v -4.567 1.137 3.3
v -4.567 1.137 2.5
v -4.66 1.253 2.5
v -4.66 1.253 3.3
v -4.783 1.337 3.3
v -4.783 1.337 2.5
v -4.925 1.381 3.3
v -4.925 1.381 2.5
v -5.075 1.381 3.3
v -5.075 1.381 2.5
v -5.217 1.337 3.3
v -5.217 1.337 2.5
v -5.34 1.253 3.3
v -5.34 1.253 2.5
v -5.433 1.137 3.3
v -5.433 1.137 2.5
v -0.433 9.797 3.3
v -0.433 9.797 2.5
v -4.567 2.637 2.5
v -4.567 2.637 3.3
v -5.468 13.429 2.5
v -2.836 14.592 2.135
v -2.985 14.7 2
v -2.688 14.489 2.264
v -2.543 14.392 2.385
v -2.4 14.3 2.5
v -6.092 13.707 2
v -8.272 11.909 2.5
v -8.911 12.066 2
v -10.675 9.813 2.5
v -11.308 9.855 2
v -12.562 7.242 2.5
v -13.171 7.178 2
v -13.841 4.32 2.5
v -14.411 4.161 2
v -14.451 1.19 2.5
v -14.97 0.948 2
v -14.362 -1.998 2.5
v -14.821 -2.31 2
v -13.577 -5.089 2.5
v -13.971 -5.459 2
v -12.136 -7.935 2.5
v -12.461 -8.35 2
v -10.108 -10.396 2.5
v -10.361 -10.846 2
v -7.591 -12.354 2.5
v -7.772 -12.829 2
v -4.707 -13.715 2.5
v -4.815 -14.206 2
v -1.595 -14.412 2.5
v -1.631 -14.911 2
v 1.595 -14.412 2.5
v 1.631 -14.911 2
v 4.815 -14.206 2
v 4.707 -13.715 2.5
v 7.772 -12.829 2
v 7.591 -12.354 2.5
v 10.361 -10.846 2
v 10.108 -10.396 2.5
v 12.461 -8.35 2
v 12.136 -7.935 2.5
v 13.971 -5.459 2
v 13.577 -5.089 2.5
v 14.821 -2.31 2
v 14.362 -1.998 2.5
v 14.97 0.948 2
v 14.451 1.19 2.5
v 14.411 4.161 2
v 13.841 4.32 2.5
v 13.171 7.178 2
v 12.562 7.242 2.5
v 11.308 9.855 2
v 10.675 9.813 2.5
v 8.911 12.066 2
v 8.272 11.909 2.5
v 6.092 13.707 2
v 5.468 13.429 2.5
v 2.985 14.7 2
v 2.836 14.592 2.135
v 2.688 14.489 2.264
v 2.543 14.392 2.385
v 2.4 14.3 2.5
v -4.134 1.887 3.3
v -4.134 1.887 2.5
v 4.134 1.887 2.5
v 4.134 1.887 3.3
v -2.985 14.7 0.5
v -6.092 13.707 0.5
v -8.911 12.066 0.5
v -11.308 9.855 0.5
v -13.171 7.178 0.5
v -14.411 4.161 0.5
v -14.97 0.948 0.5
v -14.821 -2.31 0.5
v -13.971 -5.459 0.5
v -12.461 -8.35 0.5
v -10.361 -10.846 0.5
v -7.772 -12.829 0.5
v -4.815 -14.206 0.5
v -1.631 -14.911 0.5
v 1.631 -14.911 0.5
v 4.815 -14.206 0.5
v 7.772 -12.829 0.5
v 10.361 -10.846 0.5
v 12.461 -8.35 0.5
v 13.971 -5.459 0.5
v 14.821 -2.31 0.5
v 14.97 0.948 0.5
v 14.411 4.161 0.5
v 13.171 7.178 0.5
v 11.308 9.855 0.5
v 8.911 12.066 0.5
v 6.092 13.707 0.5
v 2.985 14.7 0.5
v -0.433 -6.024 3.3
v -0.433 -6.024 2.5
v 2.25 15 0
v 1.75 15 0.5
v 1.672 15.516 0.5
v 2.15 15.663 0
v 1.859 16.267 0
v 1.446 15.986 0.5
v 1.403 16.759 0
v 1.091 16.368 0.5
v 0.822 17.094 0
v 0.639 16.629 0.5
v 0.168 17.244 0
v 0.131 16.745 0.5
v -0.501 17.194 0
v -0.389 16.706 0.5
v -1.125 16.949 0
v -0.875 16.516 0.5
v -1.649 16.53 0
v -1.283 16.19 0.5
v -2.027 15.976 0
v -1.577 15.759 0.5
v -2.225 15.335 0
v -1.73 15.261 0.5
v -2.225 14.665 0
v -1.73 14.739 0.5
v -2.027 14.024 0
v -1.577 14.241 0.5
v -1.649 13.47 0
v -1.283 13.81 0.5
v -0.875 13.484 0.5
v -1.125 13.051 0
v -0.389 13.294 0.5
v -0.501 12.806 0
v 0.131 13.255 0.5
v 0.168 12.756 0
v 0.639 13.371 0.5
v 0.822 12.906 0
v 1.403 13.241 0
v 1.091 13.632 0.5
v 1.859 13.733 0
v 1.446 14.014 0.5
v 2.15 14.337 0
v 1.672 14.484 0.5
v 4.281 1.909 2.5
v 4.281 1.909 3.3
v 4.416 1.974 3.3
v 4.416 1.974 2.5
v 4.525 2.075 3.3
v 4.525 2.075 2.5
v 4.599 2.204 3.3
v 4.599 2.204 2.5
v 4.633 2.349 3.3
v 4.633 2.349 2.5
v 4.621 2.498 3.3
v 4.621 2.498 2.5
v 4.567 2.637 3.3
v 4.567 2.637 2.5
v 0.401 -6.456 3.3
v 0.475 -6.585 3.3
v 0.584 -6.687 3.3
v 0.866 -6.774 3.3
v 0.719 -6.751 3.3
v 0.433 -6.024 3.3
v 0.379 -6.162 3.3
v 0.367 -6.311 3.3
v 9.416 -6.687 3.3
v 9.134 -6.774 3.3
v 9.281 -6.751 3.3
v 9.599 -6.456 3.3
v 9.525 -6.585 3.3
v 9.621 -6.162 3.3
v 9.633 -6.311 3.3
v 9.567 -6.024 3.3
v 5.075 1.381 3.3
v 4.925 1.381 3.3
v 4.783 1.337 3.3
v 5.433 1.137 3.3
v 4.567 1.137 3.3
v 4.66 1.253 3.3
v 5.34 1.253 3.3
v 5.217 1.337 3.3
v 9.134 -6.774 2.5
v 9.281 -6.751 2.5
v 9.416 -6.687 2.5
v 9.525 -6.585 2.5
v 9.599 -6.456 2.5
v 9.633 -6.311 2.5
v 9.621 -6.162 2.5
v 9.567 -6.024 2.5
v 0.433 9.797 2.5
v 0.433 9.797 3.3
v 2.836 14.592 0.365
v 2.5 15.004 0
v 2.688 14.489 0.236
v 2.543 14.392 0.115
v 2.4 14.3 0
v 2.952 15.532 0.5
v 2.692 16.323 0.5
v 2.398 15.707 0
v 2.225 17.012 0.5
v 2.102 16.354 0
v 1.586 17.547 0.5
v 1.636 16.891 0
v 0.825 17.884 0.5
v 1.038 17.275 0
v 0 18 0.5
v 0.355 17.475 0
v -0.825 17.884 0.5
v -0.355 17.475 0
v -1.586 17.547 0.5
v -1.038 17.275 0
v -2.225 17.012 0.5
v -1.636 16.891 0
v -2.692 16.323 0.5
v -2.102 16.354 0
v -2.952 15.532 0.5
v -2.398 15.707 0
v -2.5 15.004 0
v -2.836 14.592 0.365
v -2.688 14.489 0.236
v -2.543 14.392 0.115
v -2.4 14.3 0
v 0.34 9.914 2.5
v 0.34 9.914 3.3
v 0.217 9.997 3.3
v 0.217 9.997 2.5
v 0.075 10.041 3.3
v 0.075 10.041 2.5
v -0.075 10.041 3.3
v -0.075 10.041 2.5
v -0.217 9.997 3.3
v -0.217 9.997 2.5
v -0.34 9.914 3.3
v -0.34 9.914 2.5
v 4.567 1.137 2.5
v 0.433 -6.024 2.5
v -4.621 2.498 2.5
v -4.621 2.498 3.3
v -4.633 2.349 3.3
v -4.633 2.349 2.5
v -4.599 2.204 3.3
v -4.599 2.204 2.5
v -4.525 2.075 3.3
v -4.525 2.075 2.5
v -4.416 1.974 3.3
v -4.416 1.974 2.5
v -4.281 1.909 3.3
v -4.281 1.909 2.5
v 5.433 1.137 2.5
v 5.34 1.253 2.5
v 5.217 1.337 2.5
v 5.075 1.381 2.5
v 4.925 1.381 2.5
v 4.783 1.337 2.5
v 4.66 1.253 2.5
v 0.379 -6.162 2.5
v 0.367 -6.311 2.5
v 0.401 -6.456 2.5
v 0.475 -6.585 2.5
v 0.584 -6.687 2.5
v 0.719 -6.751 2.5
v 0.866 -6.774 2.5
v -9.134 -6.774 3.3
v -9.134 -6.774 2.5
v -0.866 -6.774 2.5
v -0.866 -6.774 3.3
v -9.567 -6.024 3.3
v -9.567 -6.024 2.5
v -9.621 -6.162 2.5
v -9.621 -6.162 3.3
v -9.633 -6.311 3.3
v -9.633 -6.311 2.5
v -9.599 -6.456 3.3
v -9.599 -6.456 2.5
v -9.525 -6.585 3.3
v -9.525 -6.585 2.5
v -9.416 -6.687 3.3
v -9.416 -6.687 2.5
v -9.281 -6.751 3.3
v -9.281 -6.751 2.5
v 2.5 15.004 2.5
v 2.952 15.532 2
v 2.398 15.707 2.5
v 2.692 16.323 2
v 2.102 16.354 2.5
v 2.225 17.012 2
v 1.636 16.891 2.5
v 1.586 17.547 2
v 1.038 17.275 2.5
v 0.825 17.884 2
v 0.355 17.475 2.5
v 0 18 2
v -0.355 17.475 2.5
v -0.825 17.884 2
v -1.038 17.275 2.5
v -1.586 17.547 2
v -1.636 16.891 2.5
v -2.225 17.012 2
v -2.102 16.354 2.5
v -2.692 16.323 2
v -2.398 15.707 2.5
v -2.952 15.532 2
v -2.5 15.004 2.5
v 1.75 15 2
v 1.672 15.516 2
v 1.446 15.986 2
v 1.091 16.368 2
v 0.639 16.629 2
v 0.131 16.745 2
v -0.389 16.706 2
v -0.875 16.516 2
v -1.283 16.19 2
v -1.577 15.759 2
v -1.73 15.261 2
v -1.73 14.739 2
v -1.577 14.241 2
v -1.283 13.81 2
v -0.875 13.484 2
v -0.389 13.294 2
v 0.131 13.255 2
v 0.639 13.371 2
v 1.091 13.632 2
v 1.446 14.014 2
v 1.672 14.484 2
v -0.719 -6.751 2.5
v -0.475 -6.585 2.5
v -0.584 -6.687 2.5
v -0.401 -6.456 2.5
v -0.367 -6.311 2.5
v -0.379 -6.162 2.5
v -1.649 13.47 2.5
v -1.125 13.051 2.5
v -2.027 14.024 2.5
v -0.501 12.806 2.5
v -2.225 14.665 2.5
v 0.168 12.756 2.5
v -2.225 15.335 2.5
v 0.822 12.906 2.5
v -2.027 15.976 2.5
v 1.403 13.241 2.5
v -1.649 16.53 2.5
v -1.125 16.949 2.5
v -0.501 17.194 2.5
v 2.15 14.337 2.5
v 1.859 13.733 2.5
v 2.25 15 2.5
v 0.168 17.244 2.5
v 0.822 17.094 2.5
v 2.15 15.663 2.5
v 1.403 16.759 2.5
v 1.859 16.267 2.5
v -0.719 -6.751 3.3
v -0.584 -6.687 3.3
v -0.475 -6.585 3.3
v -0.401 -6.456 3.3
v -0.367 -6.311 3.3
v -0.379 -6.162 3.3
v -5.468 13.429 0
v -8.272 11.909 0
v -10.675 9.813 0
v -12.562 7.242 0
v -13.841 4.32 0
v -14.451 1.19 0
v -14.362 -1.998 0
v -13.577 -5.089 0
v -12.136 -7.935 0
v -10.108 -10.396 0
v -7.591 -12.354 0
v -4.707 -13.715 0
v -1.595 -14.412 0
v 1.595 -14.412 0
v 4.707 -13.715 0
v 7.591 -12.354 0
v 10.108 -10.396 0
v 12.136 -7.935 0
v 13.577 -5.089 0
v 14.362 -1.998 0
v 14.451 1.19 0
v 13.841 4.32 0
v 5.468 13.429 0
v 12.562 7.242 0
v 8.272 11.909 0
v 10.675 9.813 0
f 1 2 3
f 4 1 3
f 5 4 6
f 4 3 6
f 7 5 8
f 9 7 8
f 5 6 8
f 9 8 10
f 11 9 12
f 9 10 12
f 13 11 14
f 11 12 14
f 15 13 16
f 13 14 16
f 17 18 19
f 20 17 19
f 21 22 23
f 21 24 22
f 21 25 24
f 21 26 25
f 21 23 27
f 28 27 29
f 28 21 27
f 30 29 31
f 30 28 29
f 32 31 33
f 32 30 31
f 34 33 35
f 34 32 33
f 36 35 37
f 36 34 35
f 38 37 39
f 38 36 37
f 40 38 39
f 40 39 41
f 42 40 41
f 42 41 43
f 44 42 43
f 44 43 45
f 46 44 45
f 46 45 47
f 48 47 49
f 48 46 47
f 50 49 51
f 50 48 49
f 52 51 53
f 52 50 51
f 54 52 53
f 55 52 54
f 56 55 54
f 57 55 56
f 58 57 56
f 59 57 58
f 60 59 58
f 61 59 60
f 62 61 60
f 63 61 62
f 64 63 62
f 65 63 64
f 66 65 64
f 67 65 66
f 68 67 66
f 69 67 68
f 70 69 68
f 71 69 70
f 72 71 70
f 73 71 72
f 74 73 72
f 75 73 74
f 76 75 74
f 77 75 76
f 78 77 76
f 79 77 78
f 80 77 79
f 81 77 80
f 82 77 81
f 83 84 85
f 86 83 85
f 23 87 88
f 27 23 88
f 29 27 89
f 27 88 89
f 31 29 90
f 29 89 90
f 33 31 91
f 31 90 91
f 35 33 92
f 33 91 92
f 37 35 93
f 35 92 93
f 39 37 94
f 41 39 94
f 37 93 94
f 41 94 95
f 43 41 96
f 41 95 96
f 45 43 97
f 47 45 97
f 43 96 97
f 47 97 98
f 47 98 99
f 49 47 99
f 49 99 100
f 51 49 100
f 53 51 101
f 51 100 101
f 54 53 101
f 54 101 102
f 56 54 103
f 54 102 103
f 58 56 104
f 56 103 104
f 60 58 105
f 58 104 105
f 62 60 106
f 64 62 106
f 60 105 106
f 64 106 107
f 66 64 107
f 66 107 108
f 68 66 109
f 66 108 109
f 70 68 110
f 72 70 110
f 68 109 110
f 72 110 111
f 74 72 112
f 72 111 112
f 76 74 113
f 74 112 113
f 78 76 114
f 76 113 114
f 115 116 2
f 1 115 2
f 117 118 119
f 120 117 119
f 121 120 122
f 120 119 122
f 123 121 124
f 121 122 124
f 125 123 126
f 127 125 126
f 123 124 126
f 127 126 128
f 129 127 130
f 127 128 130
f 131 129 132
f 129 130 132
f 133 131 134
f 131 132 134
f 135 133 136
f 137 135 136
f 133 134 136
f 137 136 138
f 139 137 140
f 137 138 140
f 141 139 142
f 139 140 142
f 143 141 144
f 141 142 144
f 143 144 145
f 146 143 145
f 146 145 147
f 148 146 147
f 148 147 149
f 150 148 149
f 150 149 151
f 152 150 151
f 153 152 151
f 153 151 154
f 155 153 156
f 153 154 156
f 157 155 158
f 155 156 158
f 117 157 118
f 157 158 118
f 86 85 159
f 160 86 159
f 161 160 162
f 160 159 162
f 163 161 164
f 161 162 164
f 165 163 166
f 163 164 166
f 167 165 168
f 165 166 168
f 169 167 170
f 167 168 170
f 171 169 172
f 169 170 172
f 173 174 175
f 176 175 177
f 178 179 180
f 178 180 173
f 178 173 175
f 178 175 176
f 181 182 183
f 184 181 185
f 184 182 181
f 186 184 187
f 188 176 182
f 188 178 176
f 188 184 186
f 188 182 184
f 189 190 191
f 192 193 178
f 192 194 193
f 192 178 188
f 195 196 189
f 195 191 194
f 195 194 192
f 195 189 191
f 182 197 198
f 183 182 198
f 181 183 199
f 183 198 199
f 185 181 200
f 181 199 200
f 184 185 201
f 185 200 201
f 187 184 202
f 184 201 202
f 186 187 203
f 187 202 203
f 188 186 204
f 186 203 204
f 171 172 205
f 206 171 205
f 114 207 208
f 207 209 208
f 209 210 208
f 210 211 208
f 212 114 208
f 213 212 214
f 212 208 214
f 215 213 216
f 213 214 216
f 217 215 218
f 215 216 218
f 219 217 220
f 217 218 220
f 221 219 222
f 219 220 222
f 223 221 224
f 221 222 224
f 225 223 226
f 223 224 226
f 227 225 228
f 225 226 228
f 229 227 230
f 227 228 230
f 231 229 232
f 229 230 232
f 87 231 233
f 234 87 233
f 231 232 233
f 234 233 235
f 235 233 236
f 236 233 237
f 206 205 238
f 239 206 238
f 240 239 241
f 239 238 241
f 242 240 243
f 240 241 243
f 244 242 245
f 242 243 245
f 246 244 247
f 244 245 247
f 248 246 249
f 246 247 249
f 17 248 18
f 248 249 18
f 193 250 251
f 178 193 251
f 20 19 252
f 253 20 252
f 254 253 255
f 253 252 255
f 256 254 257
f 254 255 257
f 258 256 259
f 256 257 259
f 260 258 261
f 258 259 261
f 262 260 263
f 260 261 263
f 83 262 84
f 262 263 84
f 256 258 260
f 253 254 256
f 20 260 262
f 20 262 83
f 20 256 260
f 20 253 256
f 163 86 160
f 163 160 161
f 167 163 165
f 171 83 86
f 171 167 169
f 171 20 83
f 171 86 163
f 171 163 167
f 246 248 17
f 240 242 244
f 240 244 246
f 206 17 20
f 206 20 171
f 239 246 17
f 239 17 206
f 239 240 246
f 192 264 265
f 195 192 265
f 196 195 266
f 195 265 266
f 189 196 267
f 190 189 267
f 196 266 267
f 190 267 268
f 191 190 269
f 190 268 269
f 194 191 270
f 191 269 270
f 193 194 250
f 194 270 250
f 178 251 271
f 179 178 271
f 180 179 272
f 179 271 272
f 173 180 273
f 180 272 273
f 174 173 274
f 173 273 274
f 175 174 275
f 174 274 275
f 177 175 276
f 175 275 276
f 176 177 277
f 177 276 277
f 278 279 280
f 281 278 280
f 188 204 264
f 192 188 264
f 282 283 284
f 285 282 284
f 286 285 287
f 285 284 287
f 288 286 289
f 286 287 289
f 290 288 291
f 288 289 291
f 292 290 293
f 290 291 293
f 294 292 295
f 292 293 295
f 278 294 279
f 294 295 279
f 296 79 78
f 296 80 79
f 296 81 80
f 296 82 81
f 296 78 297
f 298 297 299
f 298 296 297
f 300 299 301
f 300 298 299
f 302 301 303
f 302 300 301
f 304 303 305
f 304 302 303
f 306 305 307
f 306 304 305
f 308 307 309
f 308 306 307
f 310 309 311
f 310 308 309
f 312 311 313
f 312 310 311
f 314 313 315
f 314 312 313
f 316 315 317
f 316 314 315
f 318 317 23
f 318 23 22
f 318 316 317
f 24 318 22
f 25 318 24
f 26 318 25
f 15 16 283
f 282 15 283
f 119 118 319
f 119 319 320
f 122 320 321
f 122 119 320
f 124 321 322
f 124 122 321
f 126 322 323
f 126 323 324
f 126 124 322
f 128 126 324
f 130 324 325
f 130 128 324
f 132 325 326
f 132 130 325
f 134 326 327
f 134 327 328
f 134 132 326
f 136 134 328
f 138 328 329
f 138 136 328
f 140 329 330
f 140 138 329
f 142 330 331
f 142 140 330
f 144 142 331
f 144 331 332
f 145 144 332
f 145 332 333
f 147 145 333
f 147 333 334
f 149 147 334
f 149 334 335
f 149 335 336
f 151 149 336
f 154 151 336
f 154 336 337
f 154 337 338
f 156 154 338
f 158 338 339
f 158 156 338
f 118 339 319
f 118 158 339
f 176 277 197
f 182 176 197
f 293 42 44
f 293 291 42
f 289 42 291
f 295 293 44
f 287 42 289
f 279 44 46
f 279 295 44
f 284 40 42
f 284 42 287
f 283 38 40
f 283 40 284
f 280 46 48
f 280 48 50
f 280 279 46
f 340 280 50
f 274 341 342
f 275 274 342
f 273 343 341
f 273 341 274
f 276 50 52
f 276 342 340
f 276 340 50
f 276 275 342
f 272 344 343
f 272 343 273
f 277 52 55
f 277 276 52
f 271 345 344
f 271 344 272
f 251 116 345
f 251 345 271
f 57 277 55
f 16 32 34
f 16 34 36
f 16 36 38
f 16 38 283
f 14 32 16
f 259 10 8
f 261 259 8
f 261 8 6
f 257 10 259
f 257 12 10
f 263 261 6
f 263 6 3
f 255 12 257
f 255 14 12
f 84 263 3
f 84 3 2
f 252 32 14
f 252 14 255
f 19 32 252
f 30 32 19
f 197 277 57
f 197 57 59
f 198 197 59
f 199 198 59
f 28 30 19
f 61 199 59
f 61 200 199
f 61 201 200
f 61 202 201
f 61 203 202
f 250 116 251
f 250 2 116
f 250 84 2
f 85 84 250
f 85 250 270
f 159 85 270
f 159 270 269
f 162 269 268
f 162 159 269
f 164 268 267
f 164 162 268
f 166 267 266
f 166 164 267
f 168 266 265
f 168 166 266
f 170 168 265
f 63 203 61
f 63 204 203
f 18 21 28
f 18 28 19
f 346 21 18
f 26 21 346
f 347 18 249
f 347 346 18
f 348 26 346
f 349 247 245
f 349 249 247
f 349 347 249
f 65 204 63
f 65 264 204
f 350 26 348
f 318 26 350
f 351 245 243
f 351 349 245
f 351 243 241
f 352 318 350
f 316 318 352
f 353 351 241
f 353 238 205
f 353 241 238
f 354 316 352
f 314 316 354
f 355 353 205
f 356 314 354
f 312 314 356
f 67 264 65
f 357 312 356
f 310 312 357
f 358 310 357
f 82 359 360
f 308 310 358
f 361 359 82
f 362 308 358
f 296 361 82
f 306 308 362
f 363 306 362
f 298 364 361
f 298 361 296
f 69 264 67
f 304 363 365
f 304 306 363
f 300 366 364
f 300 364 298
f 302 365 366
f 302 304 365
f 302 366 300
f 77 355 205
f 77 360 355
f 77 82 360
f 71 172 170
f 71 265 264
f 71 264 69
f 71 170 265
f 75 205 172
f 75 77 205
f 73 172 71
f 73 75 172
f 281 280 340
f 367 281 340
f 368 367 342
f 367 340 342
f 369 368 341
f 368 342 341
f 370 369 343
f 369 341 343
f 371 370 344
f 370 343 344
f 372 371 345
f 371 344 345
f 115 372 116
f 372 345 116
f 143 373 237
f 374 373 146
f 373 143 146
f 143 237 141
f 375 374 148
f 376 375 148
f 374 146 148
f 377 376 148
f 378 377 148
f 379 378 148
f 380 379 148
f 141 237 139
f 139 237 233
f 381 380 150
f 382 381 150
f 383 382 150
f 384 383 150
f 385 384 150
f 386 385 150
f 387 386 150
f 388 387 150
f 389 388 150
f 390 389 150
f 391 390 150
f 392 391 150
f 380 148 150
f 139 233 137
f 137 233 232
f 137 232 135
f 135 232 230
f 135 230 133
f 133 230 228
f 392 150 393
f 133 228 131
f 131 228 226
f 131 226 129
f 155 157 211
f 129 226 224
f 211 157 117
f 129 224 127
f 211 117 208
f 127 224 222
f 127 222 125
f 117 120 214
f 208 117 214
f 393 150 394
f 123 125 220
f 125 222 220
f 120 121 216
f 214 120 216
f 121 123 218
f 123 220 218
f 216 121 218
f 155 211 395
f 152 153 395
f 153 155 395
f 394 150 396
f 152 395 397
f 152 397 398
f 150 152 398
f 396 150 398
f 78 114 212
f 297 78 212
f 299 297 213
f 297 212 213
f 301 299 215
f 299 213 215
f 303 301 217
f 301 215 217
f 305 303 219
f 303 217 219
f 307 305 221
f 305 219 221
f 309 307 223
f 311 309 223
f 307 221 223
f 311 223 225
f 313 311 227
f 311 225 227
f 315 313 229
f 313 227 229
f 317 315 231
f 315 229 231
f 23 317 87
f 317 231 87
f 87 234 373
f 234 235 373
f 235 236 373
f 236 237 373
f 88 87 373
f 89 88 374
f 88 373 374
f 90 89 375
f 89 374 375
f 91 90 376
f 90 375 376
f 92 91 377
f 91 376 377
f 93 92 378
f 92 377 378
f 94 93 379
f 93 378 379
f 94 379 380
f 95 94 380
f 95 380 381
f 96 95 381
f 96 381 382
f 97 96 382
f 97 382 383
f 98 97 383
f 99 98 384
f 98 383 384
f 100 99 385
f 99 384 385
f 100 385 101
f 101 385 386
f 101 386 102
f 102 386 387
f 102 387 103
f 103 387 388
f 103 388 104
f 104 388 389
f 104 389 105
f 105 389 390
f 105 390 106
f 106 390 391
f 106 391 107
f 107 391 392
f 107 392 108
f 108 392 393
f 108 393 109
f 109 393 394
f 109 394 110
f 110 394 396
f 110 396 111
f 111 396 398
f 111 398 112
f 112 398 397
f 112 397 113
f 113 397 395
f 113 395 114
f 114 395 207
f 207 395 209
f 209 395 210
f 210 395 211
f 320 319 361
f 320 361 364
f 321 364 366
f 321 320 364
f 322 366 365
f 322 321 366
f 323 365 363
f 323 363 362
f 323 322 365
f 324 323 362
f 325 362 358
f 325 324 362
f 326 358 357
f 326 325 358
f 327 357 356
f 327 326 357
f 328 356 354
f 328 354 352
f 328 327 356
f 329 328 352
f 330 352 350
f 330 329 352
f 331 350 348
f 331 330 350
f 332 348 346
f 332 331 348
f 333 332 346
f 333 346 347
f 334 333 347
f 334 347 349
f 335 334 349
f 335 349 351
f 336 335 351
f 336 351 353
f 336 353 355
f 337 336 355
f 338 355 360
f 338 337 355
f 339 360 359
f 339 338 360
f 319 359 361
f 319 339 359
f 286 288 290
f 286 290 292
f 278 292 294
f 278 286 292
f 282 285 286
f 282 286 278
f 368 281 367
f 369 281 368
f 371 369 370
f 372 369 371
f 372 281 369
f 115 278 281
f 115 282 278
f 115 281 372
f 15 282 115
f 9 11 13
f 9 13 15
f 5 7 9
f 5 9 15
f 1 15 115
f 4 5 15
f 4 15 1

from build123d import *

# Parameters (mm, degrees)
F0_R     = 1.75
F1_DEPTH = 2.5
F3_DEPTH = 0.8
F4_SIZE  = 0.5


with BuildPart() as f1:
    # F0 (on Top) → F1 (new body)
    with BuildSketch(Plane.XY):
        with BuildLine():
            ThreePointArc((2.984962, 14.7), (0, 18), (-2.984962, 14.7))
            ThreePointArc((-2.984962, 14.7), (0, -15), (2.984962, 14.7))
        make_face()
        with Locations((0, 15)):
            Circle(F0_R, mode=Mode.SUBTRACT)
    extrude(amount=F1_DEPTH)

    # F2 (on face) → F3 (join)
    with BuildSketch(Plane.XY.offset(2.5)):
        with BuildLine():
            Line((-4.133975, 1.886751), (4.133975, 1.886751))
            ThreePointArc((4.133975, 1.886751), (4.566987, 2.136751), (4.566987, 2.636751))
            Line((4.566987, 2.636751), (0.433013, 9.797005))
            ThreePointArc((0.433013, 9.797005), (0, 10.047005), (-0.433013, 9.797005))
            Line((-0.433013, 9.797005), (-4.566987, 2.636751))
            ThreePointArc((-4.566987, 2.636751), (-4.566987, 2.136751), (-4.133975, 1.886751))
        make_face()
        with BuildLine():
            ThreePointArc((-4.566987, 1.136751), (-5, 1.386751), (-5.433013, 1.136751))
            Line((-5.433013, 1.136751), (-9.566987, -6.023503))
            ThreePointArc((-9.566987, -6.023503), (-9.566987, -6.523503), (-9.133975, -6.773503))
            Line((-9.133975, -6.773503), (-0.866025, -6.773503))
            ThreePointArc((-0.866025, -6.773503), (-0.433013, -6.523503), (-0.433013, -6.023503))
            Line((-0.433013, -6.023503), (-4.566987, 1.136751))
        make_face()
        with BuildLine():
            Line((4.566987, 1.136751), (0.433013, -6.023503))
            ThreePointArc((0.433013, -6.023503), (0.433013, -6.523503), (0.866025, -6.773503))
            Line((0.866025, -6.773503), (9.133975, -6.773503))
            ThreePointArc((9.133975, -6.773503), (9.566987, -6.523503), (9.566987, -6.023503))
            Line((9.566987, -6.023503), (5.433013, 1.136751))
            ThreePointArc((5.433013, 1.136751), (5, 1.386751), (4.566987, 1.136751))
        make_face()
    extrude(amount=F3_DEPTH)

    # F4
    f4_edges = [f1.edges().sort_by_distance(p)[0] for p in [
        (0, -15, 2.5),
        (0, -15, 0),
        (0, 18, 2.5),
        (0, 18, 0),
        (-1.75, 15, 0),
        (-1.75, 15, 2.5),
    ]]
    chamfer(f4_edges, length=F4_SIZE)


solid = f1.part
